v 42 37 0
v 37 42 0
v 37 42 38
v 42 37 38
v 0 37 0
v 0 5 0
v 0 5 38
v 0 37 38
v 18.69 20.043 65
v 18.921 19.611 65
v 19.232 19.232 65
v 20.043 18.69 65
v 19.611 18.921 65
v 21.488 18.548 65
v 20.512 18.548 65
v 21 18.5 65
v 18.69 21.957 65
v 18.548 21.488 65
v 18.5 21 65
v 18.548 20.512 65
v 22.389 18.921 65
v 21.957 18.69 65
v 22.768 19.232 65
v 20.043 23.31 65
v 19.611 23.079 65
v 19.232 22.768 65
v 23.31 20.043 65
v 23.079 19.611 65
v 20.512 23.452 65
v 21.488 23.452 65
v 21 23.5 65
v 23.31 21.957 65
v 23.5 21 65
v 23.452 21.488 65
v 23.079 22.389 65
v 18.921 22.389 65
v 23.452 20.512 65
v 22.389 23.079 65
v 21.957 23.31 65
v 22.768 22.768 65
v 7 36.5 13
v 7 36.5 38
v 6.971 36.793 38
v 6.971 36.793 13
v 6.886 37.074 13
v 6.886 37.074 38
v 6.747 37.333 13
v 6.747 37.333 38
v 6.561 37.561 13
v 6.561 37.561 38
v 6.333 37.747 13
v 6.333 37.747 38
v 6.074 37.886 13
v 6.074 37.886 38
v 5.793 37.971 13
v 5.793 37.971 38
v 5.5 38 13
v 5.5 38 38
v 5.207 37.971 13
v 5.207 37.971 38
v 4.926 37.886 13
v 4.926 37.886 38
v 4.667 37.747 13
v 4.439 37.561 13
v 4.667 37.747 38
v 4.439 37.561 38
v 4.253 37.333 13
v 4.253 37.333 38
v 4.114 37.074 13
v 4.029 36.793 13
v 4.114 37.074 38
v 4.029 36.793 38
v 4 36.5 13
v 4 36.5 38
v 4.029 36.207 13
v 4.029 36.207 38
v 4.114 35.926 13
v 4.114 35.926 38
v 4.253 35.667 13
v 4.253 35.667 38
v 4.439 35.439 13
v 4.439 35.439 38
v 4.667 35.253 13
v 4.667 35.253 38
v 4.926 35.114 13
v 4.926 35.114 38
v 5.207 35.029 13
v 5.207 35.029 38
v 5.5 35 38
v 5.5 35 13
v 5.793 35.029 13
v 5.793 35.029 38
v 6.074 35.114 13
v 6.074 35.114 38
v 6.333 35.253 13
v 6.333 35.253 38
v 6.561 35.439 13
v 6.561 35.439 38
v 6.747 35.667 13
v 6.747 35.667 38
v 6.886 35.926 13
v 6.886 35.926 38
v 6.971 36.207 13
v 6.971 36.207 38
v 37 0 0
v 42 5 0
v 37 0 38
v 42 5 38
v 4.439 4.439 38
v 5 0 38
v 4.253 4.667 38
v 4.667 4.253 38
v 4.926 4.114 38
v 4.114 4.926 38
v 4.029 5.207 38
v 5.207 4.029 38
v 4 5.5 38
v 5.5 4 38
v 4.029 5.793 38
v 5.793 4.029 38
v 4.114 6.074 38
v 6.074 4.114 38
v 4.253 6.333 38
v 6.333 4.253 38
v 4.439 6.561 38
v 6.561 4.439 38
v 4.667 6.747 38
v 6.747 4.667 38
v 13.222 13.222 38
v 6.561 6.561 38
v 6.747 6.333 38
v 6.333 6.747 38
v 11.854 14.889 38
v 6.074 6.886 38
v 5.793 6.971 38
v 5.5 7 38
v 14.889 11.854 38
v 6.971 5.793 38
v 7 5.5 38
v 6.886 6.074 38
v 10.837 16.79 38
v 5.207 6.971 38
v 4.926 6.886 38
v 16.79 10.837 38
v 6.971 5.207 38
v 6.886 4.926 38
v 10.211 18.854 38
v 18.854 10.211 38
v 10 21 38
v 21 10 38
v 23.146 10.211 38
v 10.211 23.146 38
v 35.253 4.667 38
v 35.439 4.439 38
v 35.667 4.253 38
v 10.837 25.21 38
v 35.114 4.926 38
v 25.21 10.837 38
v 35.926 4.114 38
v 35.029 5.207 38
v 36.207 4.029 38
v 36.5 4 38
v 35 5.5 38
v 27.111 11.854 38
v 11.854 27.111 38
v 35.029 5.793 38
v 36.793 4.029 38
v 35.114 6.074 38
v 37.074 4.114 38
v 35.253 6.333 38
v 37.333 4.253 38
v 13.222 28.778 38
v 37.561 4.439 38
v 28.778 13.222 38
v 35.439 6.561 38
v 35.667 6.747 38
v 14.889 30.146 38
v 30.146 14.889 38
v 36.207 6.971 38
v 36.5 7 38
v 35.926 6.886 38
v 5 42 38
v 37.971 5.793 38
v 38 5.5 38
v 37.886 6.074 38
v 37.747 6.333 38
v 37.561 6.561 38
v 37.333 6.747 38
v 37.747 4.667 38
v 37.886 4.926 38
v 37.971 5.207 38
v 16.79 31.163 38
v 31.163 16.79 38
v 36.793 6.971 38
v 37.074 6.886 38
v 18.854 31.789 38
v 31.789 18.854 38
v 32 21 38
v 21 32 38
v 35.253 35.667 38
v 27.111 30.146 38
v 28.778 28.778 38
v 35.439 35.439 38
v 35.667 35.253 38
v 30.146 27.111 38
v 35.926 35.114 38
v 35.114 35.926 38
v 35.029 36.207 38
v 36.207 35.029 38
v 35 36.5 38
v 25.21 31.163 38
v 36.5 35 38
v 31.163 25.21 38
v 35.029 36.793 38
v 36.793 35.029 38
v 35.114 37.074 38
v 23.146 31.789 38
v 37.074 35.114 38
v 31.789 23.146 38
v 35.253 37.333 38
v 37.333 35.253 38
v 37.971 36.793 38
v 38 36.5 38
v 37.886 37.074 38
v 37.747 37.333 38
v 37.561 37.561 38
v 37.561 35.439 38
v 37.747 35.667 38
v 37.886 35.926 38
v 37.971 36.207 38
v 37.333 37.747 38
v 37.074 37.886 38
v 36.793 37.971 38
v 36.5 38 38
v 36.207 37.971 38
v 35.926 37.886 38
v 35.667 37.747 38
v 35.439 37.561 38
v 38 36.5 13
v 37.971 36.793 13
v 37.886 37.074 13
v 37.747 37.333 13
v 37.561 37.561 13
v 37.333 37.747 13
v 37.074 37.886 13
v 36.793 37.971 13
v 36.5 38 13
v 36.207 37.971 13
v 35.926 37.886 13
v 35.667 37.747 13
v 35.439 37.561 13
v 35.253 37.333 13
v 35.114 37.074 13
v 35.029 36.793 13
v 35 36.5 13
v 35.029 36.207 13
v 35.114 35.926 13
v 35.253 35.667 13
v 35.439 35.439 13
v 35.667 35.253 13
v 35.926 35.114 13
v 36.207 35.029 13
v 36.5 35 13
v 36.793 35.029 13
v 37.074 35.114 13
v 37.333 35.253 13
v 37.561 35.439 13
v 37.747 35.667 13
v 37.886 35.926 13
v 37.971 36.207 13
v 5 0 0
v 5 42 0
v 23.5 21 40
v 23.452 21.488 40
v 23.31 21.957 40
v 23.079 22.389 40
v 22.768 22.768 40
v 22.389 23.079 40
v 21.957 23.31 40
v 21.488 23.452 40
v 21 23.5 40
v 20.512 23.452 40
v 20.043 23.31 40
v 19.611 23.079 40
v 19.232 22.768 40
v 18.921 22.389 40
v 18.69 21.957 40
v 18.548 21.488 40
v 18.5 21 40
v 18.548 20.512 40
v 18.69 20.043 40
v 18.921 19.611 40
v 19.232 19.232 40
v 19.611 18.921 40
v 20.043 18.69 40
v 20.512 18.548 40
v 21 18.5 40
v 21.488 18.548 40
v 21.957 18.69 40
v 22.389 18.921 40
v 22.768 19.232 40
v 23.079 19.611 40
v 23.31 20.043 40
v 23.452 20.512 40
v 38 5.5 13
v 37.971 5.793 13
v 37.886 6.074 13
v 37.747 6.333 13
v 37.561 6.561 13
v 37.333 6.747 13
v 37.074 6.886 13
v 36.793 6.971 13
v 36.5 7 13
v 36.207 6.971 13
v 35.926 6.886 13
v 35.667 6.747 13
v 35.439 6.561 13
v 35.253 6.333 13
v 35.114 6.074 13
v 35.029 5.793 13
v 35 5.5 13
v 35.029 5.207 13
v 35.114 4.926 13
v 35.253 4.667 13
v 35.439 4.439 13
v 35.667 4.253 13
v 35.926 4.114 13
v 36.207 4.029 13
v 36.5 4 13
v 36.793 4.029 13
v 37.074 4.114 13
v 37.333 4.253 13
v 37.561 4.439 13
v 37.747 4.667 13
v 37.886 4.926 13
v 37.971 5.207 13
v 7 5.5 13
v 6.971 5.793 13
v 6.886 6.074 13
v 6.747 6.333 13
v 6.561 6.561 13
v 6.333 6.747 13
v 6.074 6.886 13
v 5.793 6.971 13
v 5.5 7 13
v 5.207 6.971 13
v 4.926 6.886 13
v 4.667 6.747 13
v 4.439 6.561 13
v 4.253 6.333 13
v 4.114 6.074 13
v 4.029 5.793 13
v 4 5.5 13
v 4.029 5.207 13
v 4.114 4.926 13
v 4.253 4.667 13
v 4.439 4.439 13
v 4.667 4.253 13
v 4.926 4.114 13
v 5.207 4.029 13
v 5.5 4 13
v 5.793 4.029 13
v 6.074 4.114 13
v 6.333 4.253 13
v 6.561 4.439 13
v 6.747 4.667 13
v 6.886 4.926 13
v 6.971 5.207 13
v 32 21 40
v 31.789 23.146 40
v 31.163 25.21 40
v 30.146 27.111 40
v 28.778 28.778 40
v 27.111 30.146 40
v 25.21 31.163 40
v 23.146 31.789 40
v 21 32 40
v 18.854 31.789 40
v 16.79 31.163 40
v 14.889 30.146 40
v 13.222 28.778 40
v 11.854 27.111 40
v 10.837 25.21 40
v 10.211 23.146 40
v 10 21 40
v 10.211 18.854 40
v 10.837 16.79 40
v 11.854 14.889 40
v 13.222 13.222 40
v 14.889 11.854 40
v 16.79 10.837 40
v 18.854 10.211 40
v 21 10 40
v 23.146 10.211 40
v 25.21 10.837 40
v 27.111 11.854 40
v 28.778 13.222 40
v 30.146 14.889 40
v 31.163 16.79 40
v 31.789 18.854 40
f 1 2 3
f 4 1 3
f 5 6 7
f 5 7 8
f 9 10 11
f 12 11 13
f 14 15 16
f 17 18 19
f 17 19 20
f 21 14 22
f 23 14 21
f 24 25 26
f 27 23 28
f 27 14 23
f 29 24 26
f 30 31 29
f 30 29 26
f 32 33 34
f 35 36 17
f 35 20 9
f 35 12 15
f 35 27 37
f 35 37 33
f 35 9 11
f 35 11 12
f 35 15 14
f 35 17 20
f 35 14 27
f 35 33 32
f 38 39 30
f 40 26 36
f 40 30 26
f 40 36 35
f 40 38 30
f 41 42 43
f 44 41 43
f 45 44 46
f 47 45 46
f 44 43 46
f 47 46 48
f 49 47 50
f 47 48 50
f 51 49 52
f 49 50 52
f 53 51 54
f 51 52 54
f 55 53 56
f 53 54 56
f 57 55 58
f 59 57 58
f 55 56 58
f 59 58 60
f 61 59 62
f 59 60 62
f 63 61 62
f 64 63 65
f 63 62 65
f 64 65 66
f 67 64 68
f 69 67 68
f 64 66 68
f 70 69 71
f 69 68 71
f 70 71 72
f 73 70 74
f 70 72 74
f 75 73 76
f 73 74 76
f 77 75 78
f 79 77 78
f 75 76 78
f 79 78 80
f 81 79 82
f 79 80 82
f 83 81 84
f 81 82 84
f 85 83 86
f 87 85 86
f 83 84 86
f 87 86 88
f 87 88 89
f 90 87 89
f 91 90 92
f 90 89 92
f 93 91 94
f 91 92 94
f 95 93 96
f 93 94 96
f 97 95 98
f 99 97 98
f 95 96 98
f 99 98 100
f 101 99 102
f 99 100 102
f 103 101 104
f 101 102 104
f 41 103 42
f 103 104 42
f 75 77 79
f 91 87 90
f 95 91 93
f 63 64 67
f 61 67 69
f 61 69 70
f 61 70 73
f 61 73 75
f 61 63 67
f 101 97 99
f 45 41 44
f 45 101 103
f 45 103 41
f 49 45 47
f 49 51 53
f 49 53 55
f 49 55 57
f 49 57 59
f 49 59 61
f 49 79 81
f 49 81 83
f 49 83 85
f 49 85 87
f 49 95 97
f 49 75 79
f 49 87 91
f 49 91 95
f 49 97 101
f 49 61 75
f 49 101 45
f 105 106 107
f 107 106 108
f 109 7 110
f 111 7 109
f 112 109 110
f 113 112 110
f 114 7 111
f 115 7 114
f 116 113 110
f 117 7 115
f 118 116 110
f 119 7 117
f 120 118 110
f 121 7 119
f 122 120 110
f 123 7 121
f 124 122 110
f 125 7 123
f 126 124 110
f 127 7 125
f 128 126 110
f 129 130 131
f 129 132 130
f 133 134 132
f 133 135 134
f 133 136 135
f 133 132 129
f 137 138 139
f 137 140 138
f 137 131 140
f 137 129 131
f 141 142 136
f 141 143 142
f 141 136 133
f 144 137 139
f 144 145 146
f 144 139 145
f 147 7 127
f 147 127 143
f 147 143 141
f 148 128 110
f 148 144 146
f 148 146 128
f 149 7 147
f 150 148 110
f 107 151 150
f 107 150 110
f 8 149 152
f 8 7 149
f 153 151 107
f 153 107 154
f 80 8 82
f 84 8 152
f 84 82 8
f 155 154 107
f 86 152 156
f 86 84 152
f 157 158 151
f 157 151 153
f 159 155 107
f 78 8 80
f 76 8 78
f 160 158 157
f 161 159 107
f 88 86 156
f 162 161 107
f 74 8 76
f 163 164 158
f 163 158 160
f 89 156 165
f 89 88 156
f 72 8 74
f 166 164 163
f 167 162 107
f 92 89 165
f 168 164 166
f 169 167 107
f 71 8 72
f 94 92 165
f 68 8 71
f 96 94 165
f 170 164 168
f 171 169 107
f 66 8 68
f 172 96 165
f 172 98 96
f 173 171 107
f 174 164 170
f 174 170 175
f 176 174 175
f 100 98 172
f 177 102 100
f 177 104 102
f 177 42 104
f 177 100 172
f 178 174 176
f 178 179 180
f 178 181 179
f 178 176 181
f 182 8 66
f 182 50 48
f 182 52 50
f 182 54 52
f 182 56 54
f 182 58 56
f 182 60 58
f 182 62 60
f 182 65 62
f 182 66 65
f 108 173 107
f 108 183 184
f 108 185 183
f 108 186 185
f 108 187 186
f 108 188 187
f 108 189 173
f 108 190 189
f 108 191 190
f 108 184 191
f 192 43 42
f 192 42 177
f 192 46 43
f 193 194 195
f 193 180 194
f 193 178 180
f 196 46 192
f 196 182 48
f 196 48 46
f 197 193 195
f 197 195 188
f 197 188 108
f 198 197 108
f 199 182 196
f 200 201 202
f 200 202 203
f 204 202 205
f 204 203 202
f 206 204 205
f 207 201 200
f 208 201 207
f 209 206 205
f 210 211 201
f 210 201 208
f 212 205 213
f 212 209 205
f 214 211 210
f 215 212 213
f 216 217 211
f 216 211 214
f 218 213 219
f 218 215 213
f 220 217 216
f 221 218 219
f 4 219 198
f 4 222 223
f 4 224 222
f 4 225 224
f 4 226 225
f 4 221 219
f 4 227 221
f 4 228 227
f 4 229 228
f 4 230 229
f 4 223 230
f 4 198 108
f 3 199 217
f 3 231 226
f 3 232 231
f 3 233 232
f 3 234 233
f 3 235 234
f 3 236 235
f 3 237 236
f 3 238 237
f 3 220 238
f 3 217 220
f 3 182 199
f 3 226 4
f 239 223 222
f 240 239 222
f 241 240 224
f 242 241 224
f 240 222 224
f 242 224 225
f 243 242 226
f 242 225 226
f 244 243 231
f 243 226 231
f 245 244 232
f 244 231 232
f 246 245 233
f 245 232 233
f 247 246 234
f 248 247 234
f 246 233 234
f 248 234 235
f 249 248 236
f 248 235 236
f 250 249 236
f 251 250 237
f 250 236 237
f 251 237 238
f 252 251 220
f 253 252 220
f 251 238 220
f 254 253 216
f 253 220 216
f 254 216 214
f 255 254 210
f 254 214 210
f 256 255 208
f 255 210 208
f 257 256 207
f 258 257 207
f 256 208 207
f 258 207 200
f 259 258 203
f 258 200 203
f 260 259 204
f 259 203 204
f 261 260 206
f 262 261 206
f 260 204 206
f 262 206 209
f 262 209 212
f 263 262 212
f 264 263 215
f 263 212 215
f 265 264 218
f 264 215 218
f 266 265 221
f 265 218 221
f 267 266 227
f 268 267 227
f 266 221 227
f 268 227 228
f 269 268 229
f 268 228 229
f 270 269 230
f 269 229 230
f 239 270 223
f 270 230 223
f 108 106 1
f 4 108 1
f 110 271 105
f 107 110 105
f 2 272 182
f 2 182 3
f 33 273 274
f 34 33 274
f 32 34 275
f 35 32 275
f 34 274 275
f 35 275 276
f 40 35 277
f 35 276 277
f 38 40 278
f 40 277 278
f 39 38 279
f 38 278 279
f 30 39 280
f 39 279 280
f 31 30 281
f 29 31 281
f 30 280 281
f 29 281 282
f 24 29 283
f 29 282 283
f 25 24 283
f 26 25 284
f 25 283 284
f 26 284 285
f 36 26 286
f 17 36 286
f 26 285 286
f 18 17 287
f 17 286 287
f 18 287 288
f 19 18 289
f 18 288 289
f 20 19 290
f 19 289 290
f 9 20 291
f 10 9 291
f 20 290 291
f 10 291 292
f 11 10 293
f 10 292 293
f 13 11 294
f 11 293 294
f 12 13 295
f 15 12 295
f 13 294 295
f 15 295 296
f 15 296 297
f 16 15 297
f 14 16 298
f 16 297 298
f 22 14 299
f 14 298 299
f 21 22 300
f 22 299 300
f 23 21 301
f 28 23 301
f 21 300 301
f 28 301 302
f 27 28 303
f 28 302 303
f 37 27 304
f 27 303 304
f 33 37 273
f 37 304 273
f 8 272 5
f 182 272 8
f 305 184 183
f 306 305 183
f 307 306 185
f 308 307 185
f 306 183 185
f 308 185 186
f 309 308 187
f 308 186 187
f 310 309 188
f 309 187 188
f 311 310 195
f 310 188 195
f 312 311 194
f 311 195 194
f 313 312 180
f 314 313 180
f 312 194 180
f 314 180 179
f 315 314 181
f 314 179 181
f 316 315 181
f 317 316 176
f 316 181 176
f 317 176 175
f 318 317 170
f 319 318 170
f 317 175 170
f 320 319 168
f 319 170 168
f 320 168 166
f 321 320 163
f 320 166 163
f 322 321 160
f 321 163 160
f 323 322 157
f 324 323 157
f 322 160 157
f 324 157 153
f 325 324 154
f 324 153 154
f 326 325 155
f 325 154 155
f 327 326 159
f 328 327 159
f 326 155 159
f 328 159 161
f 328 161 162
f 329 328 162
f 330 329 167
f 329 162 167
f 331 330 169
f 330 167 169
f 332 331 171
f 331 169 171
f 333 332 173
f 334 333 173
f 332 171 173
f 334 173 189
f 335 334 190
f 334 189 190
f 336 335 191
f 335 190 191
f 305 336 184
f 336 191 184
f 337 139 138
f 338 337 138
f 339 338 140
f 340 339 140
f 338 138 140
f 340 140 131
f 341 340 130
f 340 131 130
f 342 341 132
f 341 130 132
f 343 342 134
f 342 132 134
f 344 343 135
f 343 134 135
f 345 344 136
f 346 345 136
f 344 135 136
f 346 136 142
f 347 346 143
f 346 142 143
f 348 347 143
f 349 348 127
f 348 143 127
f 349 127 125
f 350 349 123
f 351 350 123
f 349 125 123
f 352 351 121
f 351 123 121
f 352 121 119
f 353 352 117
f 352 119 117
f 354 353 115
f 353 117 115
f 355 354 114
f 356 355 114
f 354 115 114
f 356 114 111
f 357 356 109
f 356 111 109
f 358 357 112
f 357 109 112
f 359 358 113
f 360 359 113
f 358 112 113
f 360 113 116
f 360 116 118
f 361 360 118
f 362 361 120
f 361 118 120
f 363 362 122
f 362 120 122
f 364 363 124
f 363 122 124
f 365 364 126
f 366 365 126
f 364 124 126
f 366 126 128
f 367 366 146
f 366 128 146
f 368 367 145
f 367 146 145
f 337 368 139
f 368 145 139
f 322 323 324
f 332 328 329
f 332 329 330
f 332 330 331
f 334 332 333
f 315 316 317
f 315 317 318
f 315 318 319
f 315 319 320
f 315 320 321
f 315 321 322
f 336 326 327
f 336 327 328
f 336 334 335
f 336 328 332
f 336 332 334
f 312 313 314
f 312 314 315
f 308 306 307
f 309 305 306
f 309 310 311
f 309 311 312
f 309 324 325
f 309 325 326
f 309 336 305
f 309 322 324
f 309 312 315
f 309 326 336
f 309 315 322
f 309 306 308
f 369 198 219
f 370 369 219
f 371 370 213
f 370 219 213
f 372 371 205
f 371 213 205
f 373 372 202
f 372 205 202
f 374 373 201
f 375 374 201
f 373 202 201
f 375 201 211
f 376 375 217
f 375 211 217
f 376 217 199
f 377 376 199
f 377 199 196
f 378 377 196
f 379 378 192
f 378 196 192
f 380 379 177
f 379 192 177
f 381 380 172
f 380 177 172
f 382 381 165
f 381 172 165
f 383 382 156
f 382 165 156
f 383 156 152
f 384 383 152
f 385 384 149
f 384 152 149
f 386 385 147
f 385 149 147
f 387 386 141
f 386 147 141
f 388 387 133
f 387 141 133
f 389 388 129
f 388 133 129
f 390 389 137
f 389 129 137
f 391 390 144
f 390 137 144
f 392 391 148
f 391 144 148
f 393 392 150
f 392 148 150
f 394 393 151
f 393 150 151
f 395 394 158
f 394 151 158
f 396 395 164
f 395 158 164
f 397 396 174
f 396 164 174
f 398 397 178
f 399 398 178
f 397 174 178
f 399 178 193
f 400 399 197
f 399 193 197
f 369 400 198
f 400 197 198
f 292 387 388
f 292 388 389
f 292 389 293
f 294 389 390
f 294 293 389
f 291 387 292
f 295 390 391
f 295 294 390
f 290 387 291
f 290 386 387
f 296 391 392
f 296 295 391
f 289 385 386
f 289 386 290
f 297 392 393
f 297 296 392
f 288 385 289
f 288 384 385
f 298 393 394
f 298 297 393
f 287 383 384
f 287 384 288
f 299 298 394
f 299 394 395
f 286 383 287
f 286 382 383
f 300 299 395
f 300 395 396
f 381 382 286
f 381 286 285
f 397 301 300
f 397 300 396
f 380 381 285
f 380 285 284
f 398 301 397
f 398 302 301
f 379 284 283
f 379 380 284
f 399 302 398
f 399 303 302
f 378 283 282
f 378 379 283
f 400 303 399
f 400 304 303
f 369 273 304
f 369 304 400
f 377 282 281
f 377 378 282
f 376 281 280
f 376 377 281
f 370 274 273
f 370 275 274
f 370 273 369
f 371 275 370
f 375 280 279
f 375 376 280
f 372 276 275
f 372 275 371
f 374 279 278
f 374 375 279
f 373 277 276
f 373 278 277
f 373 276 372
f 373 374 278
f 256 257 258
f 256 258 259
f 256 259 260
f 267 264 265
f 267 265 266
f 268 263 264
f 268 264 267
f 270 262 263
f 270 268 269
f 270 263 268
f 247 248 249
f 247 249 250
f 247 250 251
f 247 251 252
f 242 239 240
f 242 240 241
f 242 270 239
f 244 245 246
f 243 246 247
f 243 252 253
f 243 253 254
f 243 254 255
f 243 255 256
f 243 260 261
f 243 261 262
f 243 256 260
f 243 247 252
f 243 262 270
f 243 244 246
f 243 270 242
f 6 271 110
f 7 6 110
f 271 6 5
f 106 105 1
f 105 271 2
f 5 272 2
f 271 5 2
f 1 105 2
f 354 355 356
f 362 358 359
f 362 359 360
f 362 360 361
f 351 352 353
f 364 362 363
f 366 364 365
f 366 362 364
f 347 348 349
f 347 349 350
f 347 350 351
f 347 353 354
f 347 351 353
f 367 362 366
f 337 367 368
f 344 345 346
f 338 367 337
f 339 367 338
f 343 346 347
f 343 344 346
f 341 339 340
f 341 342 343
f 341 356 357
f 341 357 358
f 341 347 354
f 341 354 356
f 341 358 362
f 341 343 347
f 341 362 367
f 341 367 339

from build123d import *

# Parameters (mm, degrees)
F0_W     = 42
F0_H     = 42
F1_DEPTH = 38
F2_SIZE  = 5
F3_R     = 11
F4_DEPTH = 2
F5_R     = 2.5
F6_DEPTH = 25
F7_R     = 1.5
F8_DEPTH = 25


with BuildPart() as f1:
    # F0 (on Top) → F1 (new body)
    with BuildSketch(Plane.XY):
        with Locations((21, 21)):
            Rectangle(F0_W, F0_H)
    extrude(amount=F1_DEPTH)

    # F2
    f2_edges = [f1.edges().sort_by_distance(p)[0] for p in [
        (0, 0, 19),
        (0, 42, 19),
        (42, 0, 19),
        (42, 42, 19),
    ]]
    chamfer(f2_edges, length=F2_SIZE)

    # F3 (on face) → F4 (join)
    with BuildSketch(Plane.XY.offset(38)):
        with Locations((21, 21)):
            Circle(F3_R)
    extrude(amount=F4_DEPTH)

    # F5 (on face) → F6 (join)
    with BuildSketch(Plane.XY.offset(40)):
        with Locations((21, 21)):
            Circle(F5_R)
    extrude(amount=F6_DEPTH)

    # F7 (on face) → F8 (cut)
    with BuildSketch(Plane.XY.offset(38)):
        with Locations((5.5, 36.5)):
            Circle(F7_R)
        with Locations((5.5, 5.5)):
            Circle(F7_R)
        with Locations((36.5, 36.5)):
            Circle(F7_R)
        with Locations((36.5, 5.5)):
            Circle(F7_R)
    extrude(amount=-F8_DEPTH, mode=Mode.SUBTRACT)


solid = f1.part
